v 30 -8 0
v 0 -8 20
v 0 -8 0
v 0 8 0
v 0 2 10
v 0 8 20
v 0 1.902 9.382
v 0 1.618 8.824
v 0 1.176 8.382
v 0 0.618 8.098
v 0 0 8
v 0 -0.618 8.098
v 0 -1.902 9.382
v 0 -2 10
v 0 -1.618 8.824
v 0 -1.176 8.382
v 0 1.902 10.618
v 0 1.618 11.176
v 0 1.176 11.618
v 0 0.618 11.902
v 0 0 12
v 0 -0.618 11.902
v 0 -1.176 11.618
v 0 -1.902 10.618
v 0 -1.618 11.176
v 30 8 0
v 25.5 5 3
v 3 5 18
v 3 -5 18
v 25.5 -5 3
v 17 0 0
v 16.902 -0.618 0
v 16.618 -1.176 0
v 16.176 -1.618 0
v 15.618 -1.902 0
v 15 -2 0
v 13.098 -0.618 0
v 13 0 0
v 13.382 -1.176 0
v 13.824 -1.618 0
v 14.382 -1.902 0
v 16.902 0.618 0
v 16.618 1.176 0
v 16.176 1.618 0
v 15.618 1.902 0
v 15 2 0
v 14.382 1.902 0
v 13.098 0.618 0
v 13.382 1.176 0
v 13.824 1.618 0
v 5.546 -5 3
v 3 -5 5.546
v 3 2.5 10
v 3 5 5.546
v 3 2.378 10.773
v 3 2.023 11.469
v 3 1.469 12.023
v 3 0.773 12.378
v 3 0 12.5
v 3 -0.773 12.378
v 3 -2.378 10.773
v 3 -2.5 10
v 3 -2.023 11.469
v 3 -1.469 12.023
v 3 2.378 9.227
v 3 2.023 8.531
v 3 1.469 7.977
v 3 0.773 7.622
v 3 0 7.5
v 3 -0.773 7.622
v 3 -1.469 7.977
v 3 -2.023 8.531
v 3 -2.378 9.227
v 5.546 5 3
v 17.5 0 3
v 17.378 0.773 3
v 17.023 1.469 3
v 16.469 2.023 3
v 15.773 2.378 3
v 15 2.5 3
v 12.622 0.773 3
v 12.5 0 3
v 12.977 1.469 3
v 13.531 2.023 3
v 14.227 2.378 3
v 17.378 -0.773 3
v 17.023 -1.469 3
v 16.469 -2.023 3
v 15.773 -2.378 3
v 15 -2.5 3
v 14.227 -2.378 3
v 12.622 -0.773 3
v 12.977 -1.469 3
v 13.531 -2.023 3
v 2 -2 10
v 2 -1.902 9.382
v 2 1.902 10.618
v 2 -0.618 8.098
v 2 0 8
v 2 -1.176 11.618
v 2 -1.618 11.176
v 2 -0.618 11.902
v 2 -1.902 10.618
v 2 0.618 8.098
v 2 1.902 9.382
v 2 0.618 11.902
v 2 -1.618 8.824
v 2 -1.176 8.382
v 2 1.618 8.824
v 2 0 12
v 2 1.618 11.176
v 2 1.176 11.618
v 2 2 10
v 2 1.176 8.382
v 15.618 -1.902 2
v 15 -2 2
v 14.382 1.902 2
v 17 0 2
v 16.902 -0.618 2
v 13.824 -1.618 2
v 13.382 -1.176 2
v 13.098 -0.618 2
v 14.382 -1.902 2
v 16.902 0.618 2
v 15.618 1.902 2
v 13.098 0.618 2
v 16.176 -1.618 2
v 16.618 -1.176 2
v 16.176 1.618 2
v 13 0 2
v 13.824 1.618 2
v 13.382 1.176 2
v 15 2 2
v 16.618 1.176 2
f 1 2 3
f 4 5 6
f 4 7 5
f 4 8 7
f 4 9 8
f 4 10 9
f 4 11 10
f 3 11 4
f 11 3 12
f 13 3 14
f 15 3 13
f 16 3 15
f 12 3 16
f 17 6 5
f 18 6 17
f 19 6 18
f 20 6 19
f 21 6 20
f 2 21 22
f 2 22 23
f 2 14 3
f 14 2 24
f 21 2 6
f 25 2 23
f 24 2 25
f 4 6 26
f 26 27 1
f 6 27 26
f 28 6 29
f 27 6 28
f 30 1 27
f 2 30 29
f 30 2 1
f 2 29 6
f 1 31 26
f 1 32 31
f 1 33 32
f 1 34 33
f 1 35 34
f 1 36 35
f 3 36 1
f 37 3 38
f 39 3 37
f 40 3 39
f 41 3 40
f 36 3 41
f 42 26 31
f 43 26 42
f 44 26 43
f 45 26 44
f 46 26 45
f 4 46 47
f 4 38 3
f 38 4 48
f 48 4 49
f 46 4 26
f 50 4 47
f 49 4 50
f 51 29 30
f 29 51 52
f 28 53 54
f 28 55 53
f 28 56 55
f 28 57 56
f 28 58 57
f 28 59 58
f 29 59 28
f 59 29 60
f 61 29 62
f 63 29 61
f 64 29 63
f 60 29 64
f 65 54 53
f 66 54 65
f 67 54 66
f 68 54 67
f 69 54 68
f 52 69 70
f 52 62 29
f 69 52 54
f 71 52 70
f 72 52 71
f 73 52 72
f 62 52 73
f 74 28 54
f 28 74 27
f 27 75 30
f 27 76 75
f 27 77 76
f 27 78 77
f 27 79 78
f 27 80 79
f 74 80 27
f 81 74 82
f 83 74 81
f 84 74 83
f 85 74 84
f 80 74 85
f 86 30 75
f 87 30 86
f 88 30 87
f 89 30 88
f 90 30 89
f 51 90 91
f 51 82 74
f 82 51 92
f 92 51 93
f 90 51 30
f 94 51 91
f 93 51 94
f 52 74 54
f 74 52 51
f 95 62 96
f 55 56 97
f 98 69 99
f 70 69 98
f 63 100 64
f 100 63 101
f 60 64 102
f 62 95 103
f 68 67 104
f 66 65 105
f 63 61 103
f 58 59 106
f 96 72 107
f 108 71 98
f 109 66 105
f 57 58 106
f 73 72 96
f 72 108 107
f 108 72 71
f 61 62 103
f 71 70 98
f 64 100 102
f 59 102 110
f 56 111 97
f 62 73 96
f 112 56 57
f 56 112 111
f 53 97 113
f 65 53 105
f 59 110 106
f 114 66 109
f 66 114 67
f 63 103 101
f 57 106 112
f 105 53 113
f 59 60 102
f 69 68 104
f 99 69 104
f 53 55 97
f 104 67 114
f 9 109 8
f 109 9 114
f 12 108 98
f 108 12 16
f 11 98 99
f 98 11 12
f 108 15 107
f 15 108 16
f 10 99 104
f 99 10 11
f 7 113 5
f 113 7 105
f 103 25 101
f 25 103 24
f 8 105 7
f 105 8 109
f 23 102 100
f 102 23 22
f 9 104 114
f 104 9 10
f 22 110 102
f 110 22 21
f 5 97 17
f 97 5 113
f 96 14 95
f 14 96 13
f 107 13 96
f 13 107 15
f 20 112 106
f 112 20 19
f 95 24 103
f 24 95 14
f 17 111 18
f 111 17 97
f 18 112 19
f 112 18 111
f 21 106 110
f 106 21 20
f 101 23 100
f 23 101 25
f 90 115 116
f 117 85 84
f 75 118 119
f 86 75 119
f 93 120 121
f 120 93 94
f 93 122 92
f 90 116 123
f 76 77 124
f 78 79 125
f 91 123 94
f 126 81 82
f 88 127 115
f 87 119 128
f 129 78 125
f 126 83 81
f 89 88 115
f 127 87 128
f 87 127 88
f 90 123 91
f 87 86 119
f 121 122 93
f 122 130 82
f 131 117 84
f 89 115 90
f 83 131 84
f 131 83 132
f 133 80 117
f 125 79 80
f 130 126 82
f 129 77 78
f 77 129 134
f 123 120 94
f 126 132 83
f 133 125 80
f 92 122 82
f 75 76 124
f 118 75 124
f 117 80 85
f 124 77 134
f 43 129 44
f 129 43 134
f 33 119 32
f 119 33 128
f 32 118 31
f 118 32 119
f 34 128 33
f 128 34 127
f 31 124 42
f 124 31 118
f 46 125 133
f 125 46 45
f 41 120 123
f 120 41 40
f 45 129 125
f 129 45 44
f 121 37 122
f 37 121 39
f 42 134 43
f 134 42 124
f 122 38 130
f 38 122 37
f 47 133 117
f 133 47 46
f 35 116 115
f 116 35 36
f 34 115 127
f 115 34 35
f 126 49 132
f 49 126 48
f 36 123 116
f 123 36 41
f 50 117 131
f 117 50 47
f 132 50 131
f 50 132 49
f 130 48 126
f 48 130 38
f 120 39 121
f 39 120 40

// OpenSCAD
//****************** Little shelf bracket ***************//
// Little bracket for any rickety wood shelf.            //
// 02/28/2014 - Jean-Marc Berthommé - CC BY-NC-SA        //
// Source: http://la-fabrique-du-quotidien.org/modeles/petite-equerre

//****************** Parameters to tune *****************//

// body: 30 mm x 16 mm x 20 mm
bl = 30;                           // body length - mm
bw = 16;                           // body width - mm
bh = 20;                           // body height - mm
th = 3;                            // body thickness - mm

// screws: 3 mm x 15 mm
sd = 3;                            // screw diameter - mm
sl = 15;                           // screw length - mm

// corner reinforcement
cr = 0.6;                          // corner ratio ~ [0 1]

//******************* Fixed parameters ******************//

// corner reinforcement - fixed parameters
dmin =  th*pow(2, 0.5);            // minimum distance - mm
delta_d = cr*th;                   // delta distance - mm
cw = 2*(dmin + delta_d);           // cube width - mm
echo(str("corner overflow = ", delta_d, " mm."));
// echo(str("cube width = ", cw, " mm."));

//******************** Design Check *********************//

tol = 0.5;                         // tolerance - mm

if (bw-2*th < sd + tol) {
  echo("*** Bad design *** ~> Your screws will not fit!");
  echo("Note that bw = ", bw, " mm and th = ", th, " mm.");
  echo("So bw-2*th = ", bw-2*th, " mm. That's too low!");
}

// ...

// Note that we could write a lot of code here to make safer
// designs. But that's very boring! I prefer let you "think"
// to your own bracket. After all you're a maker now, no
// longer a consumer! Right? ;D!

//********************* Instructions ********************//

translate([0, 0, bh]) rotate([180,0,0]) // best printing position

// whole bracket without the 2 screws
// **********************************

difference(){ // comment to make appear the screws

  // bracket body
  // ************
  translate([0, 0, bh]) rotate([0,90,-90])
  color([0.8, 0.5, 0.2, 0.5])
  union() {
    // main triangle
    difference() {
      linear_extrude(height = bw, center = true)
      polygon(points = [[0,0], [bh,0], [0,bl]], paths = [[0,1,2]]);
      
      translate([th, th, 0])
      linear_extrude(height = bw-2*th, center = true)
      polygon(points = [[0,0], [bh,0], [0,bl]], paths = [[0,1,2]]);
    }

    // corner reinforcement
    intersection(){
      rotate([0, 0, 45]) cube([cw, cw, bw], center = true);
      translate([0, 0, -bw/2]) cube([cw, cw, bw]);
    }
  }
  
  // horizontal screw
  // ****************
  translate([th+2/15*sl, 0, bh/2]) rotate([0,-90,0])
  color([1,1,0,0.5])
  screw(sd, sl);

  // vertical screw
  // **************
  translate([bl/2, 0, bh-(th+2/15*sl)])
  color([1,1,0,0.5])
  screw(sd, sl);
} // comment to make appear the screws

//*********************** Modules ***********************//

// screw module
// ************
// This screw model is based on wood screws of dimension:
// 3 mm x 15 mm. After a 3D printing test it was expanded
// to better handle the holes. Certainly that it is not adapted
// to all the screws. As usual a fine tuning step is required.

// Input variables:
// d: diameter - mm
// l: length - mm

module screw(d, l) {
  r = d/2;  // radius - mm
  $fn = 20; // tune the resolution
  
  union() {
    cylinder(h=2/15*l, r1=r+2.5, r2=r+1);
    translate([0, 0, 2/15*l]) cylinder(h=1/15*l, r1=r+1, r2=r+0.5);
    translate([0, 0, 3/15*l]) cylinder(h=11/15*l, r=r+0.5);
    translate([0, 0, 14/15*l]) cylinder(h=1/15*l, r1=r+0.5, r2=0);
  }
}

//********************* End Of File *********************//
